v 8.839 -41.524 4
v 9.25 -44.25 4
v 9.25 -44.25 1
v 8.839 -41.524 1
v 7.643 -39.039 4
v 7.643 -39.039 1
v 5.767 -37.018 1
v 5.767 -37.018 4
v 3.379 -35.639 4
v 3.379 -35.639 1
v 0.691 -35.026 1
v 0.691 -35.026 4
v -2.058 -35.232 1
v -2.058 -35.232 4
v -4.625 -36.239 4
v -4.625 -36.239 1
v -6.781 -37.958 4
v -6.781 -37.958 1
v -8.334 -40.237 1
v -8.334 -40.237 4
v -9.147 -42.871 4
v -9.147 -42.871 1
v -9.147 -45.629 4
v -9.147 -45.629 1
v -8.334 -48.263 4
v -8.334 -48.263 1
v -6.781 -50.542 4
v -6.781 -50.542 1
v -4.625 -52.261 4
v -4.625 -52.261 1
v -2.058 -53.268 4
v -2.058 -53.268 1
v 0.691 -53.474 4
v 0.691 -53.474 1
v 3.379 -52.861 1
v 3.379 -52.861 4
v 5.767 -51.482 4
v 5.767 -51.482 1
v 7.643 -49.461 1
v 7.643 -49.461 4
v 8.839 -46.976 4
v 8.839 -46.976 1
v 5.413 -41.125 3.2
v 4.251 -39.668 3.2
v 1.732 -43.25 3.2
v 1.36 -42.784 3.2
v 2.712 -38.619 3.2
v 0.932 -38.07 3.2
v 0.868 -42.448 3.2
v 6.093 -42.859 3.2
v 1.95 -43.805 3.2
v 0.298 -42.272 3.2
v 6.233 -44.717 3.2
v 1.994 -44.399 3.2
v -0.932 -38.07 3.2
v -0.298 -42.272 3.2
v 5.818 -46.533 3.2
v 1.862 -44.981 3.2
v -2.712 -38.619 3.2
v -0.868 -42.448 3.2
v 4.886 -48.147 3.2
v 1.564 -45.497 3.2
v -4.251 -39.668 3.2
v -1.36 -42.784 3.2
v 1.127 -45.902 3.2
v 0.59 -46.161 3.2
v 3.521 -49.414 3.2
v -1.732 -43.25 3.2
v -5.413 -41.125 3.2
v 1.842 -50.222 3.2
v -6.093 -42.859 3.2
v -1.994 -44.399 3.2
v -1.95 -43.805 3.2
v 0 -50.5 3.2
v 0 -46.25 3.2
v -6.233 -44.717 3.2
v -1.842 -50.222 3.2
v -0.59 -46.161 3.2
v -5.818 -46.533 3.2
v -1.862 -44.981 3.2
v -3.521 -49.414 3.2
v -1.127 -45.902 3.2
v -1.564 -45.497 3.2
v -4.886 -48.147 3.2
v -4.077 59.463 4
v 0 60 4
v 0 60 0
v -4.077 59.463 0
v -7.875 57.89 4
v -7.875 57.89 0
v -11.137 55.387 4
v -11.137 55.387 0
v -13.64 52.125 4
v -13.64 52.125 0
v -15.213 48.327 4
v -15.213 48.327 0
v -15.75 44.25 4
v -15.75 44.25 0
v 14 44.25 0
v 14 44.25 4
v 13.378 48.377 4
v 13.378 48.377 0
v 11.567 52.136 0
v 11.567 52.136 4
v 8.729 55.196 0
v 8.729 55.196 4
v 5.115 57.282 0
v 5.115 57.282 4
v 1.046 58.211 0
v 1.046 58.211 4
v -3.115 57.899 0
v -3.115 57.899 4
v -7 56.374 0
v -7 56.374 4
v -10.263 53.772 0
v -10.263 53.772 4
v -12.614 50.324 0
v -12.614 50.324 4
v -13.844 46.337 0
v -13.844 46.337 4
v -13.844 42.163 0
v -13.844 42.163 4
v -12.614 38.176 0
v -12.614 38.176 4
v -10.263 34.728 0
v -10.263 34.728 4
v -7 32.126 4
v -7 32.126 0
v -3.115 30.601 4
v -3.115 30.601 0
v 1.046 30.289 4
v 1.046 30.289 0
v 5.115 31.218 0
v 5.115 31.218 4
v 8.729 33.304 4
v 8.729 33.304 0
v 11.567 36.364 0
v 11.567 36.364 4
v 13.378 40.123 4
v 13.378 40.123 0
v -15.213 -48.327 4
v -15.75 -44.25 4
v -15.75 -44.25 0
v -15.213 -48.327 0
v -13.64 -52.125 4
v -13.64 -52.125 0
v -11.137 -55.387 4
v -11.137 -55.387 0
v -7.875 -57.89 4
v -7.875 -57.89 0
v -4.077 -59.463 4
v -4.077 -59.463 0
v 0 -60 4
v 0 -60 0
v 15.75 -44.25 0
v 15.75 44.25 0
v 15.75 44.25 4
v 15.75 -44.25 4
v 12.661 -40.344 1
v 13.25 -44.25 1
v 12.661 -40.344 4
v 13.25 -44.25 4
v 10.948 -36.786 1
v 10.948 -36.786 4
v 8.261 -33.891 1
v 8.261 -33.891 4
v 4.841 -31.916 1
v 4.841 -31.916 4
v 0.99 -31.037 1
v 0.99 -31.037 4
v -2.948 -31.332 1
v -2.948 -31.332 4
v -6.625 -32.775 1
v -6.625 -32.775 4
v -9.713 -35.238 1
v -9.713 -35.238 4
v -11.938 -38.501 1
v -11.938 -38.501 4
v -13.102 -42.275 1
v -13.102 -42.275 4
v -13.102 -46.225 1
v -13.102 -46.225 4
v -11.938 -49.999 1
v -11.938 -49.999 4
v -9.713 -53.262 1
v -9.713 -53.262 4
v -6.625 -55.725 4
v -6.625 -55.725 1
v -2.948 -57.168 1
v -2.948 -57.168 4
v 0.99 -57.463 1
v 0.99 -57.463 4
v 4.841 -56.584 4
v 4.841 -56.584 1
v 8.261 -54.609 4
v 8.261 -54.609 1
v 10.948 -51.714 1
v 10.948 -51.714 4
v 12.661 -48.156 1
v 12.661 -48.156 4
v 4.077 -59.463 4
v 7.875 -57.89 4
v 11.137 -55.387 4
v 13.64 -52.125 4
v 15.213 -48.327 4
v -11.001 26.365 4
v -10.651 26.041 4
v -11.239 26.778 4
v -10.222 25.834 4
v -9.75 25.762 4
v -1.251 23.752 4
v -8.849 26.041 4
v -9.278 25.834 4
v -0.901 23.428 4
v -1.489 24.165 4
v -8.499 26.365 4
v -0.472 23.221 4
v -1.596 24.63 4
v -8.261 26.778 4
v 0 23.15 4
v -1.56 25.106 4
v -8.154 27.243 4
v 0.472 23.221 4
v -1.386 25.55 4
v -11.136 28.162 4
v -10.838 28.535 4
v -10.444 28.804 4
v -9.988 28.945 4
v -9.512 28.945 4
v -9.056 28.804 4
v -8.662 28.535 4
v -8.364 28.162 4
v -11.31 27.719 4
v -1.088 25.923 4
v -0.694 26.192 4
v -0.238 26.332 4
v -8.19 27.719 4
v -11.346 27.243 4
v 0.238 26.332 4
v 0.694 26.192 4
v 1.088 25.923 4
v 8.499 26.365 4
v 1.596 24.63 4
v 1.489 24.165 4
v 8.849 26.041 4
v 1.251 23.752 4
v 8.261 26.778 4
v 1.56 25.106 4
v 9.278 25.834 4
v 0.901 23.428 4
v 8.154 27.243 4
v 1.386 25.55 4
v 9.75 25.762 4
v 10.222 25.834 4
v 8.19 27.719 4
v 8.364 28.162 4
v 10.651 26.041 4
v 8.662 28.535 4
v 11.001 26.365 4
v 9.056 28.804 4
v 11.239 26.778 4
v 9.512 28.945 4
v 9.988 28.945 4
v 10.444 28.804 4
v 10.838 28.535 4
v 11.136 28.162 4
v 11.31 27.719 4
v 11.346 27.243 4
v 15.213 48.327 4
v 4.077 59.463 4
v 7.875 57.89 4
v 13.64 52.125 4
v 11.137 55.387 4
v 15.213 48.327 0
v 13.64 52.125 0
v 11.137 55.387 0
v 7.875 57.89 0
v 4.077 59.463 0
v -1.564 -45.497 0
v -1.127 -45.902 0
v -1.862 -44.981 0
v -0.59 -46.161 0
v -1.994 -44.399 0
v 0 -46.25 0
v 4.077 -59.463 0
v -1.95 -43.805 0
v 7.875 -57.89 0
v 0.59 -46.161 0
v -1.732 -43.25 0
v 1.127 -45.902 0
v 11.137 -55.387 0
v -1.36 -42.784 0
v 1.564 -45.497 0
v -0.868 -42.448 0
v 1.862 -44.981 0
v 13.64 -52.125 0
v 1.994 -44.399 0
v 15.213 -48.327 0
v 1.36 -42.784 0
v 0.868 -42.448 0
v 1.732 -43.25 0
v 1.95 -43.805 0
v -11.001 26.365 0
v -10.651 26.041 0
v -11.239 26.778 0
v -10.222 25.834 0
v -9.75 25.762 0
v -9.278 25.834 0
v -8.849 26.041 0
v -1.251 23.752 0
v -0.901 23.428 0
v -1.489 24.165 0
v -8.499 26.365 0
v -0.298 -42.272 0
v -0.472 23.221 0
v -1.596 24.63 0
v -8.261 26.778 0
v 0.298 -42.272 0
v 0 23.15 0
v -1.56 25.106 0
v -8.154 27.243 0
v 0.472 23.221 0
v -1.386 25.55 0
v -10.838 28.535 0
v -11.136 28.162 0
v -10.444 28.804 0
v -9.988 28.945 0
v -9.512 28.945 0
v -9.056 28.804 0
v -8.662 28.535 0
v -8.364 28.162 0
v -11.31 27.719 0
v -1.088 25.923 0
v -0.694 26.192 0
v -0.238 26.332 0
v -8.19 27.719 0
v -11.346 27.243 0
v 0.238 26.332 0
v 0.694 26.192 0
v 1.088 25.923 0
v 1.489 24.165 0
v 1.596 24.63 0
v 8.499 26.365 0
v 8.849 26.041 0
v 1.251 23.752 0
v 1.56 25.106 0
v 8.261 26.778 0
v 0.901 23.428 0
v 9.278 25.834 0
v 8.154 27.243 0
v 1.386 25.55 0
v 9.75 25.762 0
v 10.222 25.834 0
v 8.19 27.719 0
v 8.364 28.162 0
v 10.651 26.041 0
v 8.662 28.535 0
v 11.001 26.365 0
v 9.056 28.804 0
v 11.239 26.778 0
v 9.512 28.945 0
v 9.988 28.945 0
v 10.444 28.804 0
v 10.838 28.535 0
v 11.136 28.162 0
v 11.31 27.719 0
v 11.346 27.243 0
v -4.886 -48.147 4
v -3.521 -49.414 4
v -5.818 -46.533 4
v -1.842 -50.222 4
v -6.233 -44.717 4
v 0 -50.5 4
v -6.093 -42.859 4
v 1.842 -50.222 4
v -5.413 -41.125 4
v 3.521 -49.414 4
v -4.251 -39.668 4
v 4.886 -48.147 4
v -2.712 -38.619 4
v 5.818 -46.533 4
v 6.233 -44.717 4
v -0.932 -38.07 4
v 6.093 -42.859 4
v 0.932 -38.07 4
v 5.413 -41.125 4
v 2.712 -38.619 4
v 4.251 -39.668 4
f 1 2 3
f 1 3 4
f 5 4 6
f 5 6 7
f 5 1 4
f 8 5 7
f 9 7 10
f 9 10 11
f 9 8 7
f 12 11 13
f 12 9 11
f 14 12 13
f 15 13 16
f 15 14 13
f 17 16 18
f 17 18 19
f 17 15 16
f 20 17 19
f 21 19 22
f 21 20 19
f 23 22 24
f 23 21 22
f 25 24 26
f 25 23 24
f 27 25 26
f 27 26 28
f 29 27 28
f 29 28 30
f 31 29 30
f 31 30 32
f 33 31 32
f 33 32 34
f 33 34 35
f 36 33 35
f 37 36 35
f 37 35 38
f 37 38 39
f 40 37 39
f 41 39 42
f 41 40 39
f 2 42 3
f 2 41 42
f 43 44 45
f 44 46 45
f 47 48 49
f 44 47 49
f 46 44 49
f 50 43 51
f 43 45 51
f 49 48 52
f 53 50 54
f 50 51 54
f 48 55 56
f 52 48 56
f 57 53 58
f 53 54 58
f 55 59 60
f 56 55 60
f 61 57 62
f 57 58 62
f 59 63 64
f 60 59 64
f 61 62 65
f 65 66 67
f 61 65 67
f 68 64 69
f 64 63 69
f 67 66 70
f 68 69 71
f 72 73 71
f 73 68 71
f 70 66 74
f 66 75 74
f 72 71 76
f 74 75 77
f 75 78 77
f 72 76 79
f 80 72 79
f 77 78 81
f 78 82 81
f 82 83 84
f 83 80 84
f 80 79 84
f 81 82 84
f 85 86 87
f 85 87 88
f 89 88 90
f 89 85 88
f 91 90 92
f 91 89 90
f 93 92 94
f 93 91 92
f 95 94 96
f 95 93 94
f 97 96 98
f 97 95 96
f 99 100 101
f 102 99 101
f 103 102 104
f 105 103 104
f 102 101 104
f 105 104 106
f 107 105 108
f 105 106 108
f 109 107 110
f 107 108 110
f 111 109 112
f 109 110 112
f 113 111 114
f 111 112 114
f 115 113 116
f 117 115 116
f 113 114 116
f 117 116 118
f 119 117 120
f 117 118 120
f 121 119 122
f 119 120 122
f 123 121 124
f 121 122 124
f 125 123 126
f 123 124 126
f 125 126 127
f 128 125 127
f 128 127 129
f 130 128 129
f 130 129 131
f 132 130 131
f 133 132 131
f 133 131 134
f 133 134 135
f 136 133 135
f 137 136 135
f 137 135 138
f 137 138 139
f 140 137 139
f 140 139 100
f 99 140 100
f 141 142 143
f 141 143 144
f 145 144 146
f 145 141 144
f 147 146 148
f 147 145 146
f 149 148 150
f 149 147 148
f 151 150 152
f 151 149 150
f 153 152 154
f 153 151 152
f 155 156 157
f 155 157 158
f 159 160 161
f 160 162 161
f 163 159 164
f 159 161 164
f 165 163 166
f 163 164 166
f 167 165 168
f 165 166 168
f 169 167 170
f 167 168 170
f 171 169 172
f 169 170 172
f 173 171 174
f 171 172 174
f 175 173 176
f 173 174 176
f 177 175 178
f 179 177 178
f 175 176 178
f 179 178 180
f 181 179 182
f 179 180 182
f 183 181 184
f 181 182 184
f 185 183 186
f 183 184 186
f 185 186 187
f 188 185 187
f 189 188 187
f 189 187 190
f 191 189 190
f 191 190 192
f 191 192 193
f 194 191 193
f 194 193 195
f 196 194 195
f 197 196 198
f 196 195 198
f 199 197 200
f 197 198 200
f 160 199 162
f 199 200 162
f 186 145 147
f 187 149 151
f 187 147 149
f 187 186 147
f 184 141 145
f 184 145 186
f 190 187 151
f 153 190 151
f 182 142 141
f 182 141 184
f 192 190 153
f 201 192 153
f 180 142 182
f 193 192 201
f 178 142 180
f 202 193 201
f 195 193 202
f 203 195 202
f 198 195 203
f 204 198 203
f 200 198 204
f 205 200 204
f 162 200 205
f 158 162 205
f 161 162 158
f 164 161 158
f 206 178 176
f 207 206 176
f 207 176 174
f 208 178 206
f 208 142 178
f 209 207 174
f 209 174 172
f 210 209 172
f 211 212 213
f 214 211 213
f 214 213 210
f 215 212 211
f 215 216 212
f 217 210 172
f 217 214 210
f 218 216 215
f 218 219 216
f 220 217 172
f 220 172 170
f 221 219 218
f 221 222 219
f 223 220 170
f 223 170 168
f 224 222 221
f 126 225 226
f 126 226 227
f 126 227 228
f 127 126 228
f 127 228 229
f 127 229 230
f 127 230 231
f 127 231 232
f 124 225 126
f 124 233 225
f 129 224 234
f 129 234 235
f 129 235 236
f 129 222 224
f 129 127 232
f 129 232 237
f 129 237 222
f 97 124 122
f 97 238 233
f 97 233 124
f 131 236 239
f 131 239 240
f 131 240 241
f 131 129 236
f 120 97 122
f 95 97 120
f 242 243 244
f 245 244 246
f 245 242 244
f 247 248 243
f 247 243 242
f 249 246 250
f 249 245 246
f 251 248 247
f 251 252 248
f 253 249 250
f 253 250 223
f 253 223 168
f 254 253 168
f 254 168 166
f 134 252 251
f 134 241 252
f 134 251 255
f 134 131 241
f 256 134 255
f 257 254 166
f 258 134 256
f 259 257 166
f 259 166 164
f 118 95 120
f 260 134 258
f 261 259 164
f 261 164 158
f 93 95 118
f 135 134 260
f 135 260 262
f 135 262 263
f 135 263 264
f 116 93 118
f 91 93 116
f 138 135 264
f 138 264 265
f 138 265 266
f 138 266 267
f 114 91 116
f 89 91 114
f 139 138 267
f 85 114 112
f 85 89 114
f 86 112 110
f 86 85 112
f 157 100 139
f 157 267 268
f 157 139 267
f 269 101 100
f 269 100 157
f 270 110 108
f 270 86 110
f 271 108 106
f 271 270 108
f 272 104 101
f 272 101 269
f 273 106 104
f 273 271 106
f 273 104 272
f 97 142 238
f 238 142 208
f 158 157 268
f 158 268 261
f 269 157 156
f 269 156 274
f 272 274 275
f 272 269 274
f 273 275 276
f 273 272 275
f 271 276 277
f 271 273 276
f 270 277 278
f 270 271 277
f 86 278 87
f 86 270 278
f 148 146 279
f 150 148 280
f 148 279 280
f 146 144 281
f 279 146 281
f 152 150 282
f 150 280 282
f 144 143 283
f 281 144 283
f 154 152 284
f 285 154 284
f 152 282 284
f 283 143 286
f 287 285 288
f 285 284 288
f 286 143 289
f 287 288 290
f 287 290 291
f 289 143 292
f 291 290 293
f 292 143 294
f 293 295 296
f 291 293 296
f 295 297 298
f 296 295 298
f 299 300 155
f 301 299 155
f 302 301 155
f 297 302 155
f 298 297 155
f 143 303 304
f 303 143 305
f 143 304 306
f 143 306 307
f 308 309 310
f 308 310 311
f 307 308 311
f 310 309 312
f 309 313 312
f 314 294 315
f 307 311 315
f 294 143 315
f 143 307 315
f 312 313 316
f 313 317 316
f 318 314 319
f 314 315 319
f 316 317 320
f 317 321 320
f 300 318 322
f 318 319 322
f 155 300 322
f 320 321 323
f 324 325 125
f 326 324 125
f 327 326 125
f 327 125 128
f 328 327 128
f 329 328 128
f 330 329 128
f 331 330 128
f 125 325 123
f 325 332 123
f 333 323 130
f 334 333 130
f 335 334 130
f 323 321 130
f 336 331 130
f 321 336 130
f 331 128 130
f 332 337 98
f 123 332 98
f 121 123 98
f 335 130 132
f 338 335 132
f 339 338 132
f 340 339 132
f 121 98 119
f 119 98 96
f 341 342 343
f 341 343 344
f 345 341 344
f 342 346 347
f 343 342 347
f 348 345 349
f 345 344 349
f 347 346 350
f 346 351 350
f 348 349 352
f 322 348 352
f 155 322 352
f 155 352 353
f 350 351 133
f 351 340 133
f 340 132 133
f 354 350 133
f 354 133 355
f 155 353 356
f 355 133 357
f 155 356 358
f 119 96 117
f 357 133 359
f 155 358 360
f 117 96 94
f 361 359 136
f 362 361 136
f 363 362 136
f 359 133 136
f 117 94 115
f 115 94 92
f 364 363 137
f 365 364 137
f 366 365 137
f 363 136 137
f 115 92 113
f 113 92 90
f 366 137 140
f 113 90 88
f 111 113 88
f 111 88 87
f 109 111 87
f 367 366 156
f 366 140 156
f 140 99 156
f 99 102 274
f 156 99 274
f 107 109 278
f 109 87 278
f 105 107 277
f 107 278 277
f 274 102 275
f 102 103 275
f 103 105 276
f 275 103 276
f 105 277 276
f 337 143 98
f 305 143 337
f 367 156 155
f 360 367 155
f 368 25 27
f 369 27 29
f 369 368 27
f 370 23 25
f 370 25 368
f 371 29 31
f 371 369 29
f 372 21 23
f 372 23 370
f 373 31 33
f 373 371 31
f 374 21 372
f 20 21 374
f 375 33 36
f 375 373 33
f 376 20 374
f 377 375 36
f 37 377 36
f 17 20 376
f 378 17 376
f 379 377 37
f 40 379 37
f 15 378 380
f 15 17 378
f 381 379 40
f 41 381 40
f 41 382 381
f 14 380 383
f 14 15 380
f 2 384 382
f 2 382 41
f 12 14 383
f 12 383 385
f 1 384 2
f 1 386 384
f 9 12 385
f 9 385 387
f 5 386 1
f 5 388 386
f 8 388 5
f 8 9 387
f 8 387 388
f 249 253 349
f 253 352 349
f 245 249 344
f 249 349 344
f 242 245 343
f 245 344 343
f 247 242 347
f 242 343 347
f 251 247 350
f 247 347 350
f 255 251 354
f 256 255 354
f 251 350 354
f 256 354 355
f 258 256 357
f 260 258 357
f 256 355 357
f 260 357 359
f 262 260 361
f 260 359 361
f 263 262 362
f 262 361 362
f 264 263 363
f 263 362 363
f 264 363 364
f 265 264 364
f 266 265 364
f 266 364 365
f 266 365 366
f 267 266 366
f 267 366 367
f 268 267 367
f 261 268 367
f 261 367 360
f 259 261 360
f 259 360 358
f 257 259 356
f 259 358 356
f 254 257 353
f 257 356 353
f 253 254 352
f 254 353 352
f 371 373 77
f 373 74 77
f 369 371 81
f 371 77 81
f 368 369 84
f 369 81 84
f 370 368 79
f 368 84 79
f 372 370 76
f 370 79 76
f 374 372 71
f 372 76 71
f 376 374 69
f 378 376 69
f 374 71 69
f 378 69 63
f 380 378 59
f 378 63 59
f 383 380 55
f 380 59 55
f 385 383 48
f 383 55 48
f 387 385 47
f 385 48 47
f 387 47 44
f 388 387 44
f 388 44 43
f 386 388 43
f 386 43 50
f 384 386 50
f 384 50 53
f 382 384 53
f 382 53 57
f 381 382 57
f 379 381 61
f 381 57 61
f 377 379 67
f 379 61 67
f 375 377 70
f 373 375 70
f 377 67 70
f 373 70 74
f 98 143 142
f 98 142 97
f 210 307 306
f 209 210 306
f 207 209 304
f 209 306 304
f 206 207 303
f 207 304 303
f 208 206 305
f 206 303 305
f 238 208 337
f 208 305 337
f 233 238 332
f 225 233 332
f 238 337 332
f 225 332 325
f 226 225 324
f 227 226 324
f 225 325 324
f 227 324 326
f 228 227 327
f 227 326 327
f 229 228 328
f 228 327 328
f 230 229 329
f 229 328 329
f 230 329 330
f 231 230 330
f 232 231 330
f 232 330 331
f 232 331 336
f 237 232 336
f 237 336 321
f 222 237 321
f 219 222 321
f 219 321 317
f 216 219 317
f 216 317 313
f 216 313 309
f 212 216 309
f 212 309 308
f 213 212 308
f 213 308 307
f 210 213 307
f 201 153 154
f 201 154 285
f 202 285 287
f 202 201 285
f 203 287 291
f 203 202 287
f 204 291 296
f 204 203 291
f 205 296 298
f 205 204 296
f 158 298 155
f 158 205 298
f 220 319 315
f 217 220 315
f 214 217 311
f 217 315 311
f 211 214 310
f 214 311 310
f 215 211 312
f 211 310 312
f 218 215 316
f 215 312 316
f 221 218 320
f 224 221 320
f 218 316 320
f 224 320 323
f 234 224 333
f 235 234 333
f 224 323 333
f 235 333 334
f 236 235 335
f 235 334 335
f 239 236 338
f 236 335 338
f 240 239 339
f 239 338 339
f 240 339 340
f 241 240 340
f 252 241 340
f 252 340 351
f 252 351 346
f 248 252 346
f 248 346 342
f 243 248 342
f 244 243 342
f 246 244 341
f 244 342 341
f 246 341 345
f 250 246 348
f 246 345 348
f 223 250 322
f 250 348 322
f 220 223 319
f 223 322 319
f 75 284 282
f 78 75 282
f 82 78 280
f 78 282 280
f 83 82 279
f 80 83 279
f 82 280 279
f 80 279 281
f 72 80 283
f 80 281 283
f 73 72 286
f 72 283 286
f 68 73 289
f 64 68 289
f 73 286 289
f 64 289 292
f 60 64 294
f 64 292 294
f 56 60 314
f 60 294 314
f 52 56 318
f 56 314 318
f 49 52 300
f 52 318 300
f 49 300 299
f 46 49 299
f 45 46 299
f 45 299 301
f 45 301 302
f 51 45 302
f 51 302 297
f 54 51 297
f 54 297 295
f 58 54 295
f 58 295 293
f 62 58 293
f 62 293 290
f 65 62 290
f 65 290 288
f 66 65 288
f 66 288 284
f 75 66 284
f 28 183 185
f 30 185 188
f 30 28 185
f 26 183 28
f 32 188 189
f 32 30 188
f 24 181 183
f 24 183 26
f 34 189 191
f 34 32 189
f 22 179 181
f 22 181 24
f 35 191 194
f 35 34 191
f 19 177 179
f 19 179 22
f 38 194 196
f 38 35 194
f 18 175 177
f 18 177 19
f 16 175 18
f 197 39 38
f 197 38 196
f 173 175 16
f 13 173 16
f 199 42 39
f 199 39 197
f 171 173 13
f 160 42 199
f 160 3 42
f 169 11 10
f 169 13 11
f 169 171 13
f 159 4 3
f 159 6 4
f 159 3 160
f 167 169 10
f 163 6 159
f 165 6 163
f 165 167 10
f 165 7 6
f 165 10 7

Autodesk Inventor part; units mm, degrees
ref_plane "YZ Plane" through (0, 0, 0) normal (1, 0, 0) x (0, 1, 0)
ref_plane "XZ Plane" through (0, 0, 0) normal (0, 1, 0) x (-1, 0, 0)
ref_plane "XY Plane" through (0, 0, 0) normal (0, 0, 1) x (1, 0, 0)
sketch "スケッチ1" plane through (0, 0, 0) normal (0, 0, 1) x (1, 0, 0)
  line L0 (-15.75, 60) -> (15.75, 60)
  line L1 (15.75, 60) -> (15.75, -60)
  line L2 (15.75, -60) -> (-15.75, -60)
  line L3 (-15.75, -60) -> (-15.75, 60)
  point P0 (0, 0)
  dimension "d0" = 31.5
  dimension "d1" = 15.75
  dimension "d2" = 120
  dimension "d3" = 60
extrude "押し出し1" add sketch "スケッチ1" along normal blind 4
fillet "フィレット1" radius 15.75 4 edges at (-15.75, -60, 2) (15.75, -60, 2) (15.75, 60, 2) (-15.75, 60, 2)
sketch "スケッチ2" plane through (0, 0, 4) normal (0, 0, 1) x (1, 0, 0)
  arc A0 (15.75, 44.25) -> (-15.75, 44.25) centre (0, 44.25) ccw projected
  circle A1 centre (0, 44.25) radius 14
  point P0 (0, 0)
  dimension "d7" = 28
extrude "押し出し2" cut sketch "スケッチ2" against normal through all
sketch "スケッチ3" plane through (0, 0, 4) normal (0, 0, 1) x (1, 0, 0)
  arc A0 (15.75, 44.25) -> (-15.75, 44.25) centre (0, 44.25) ccw projected
  circle A1 centre (0, 44.25) radius 19.5
  line L0 (0, 44.25) -> (0, 24.75)
  line L1 (0, 44.25) -> (9.75, 27.3625)
  line L2 (0, 44.25) -> (-9.75, 27.3625)
  line L3 (0, 44.25) -> (0, 63.75)
  point P0 (0, 0)
  point P1 (9.75, 27.3625)
  dimension "d10" = 39
  dimension "d11" = 150
  dimension "d13" = 30
hole "Hole1" at (-9.75, 27.3625, 4) at (9.75, 27.3625, 4) at (0, 24.75, 4) direction (0, 0, -1) diameter 3.2 depth 8 tip angle 118
sketch "スケッチ4" plane through (0, 0, 4) normal (0, 0, 1) x (1, 0, 0)
  arc A0 (-15.75, -44.25) -> (15.75, -44.25) centre (0, -44.25) ccw projected
  point P0 (0, 0)
hole "Hole2" at (0, -44.25, 4) direction (0, 0, -1) diameter 4 end through all counterbore diameter 12.5 counterbore depth 0.8
sketch "スケッチ5" plane through (0, 0, 4) normal (0, 0, 1) x (1, 0, 0)
  circle A0 centre (0, -44.25) radius 13.25
  circle A1 centre (0, -44.25) radius 9.25
  point P0 (0, 0)
  dimension "d28" = 26.5
  dimension "d29" = 18.5
extrude "押し出し3" cut sketch "スケッチ5" against normal blind 3
equation "\"d1\" = 0.5 * d0"
equation "\"d3\" = 0.5 * d2"
equation "\"d6\" = 0.5 * d0"
properties part number "JointC3'B_2nd" material "アルミニウム 6061"
